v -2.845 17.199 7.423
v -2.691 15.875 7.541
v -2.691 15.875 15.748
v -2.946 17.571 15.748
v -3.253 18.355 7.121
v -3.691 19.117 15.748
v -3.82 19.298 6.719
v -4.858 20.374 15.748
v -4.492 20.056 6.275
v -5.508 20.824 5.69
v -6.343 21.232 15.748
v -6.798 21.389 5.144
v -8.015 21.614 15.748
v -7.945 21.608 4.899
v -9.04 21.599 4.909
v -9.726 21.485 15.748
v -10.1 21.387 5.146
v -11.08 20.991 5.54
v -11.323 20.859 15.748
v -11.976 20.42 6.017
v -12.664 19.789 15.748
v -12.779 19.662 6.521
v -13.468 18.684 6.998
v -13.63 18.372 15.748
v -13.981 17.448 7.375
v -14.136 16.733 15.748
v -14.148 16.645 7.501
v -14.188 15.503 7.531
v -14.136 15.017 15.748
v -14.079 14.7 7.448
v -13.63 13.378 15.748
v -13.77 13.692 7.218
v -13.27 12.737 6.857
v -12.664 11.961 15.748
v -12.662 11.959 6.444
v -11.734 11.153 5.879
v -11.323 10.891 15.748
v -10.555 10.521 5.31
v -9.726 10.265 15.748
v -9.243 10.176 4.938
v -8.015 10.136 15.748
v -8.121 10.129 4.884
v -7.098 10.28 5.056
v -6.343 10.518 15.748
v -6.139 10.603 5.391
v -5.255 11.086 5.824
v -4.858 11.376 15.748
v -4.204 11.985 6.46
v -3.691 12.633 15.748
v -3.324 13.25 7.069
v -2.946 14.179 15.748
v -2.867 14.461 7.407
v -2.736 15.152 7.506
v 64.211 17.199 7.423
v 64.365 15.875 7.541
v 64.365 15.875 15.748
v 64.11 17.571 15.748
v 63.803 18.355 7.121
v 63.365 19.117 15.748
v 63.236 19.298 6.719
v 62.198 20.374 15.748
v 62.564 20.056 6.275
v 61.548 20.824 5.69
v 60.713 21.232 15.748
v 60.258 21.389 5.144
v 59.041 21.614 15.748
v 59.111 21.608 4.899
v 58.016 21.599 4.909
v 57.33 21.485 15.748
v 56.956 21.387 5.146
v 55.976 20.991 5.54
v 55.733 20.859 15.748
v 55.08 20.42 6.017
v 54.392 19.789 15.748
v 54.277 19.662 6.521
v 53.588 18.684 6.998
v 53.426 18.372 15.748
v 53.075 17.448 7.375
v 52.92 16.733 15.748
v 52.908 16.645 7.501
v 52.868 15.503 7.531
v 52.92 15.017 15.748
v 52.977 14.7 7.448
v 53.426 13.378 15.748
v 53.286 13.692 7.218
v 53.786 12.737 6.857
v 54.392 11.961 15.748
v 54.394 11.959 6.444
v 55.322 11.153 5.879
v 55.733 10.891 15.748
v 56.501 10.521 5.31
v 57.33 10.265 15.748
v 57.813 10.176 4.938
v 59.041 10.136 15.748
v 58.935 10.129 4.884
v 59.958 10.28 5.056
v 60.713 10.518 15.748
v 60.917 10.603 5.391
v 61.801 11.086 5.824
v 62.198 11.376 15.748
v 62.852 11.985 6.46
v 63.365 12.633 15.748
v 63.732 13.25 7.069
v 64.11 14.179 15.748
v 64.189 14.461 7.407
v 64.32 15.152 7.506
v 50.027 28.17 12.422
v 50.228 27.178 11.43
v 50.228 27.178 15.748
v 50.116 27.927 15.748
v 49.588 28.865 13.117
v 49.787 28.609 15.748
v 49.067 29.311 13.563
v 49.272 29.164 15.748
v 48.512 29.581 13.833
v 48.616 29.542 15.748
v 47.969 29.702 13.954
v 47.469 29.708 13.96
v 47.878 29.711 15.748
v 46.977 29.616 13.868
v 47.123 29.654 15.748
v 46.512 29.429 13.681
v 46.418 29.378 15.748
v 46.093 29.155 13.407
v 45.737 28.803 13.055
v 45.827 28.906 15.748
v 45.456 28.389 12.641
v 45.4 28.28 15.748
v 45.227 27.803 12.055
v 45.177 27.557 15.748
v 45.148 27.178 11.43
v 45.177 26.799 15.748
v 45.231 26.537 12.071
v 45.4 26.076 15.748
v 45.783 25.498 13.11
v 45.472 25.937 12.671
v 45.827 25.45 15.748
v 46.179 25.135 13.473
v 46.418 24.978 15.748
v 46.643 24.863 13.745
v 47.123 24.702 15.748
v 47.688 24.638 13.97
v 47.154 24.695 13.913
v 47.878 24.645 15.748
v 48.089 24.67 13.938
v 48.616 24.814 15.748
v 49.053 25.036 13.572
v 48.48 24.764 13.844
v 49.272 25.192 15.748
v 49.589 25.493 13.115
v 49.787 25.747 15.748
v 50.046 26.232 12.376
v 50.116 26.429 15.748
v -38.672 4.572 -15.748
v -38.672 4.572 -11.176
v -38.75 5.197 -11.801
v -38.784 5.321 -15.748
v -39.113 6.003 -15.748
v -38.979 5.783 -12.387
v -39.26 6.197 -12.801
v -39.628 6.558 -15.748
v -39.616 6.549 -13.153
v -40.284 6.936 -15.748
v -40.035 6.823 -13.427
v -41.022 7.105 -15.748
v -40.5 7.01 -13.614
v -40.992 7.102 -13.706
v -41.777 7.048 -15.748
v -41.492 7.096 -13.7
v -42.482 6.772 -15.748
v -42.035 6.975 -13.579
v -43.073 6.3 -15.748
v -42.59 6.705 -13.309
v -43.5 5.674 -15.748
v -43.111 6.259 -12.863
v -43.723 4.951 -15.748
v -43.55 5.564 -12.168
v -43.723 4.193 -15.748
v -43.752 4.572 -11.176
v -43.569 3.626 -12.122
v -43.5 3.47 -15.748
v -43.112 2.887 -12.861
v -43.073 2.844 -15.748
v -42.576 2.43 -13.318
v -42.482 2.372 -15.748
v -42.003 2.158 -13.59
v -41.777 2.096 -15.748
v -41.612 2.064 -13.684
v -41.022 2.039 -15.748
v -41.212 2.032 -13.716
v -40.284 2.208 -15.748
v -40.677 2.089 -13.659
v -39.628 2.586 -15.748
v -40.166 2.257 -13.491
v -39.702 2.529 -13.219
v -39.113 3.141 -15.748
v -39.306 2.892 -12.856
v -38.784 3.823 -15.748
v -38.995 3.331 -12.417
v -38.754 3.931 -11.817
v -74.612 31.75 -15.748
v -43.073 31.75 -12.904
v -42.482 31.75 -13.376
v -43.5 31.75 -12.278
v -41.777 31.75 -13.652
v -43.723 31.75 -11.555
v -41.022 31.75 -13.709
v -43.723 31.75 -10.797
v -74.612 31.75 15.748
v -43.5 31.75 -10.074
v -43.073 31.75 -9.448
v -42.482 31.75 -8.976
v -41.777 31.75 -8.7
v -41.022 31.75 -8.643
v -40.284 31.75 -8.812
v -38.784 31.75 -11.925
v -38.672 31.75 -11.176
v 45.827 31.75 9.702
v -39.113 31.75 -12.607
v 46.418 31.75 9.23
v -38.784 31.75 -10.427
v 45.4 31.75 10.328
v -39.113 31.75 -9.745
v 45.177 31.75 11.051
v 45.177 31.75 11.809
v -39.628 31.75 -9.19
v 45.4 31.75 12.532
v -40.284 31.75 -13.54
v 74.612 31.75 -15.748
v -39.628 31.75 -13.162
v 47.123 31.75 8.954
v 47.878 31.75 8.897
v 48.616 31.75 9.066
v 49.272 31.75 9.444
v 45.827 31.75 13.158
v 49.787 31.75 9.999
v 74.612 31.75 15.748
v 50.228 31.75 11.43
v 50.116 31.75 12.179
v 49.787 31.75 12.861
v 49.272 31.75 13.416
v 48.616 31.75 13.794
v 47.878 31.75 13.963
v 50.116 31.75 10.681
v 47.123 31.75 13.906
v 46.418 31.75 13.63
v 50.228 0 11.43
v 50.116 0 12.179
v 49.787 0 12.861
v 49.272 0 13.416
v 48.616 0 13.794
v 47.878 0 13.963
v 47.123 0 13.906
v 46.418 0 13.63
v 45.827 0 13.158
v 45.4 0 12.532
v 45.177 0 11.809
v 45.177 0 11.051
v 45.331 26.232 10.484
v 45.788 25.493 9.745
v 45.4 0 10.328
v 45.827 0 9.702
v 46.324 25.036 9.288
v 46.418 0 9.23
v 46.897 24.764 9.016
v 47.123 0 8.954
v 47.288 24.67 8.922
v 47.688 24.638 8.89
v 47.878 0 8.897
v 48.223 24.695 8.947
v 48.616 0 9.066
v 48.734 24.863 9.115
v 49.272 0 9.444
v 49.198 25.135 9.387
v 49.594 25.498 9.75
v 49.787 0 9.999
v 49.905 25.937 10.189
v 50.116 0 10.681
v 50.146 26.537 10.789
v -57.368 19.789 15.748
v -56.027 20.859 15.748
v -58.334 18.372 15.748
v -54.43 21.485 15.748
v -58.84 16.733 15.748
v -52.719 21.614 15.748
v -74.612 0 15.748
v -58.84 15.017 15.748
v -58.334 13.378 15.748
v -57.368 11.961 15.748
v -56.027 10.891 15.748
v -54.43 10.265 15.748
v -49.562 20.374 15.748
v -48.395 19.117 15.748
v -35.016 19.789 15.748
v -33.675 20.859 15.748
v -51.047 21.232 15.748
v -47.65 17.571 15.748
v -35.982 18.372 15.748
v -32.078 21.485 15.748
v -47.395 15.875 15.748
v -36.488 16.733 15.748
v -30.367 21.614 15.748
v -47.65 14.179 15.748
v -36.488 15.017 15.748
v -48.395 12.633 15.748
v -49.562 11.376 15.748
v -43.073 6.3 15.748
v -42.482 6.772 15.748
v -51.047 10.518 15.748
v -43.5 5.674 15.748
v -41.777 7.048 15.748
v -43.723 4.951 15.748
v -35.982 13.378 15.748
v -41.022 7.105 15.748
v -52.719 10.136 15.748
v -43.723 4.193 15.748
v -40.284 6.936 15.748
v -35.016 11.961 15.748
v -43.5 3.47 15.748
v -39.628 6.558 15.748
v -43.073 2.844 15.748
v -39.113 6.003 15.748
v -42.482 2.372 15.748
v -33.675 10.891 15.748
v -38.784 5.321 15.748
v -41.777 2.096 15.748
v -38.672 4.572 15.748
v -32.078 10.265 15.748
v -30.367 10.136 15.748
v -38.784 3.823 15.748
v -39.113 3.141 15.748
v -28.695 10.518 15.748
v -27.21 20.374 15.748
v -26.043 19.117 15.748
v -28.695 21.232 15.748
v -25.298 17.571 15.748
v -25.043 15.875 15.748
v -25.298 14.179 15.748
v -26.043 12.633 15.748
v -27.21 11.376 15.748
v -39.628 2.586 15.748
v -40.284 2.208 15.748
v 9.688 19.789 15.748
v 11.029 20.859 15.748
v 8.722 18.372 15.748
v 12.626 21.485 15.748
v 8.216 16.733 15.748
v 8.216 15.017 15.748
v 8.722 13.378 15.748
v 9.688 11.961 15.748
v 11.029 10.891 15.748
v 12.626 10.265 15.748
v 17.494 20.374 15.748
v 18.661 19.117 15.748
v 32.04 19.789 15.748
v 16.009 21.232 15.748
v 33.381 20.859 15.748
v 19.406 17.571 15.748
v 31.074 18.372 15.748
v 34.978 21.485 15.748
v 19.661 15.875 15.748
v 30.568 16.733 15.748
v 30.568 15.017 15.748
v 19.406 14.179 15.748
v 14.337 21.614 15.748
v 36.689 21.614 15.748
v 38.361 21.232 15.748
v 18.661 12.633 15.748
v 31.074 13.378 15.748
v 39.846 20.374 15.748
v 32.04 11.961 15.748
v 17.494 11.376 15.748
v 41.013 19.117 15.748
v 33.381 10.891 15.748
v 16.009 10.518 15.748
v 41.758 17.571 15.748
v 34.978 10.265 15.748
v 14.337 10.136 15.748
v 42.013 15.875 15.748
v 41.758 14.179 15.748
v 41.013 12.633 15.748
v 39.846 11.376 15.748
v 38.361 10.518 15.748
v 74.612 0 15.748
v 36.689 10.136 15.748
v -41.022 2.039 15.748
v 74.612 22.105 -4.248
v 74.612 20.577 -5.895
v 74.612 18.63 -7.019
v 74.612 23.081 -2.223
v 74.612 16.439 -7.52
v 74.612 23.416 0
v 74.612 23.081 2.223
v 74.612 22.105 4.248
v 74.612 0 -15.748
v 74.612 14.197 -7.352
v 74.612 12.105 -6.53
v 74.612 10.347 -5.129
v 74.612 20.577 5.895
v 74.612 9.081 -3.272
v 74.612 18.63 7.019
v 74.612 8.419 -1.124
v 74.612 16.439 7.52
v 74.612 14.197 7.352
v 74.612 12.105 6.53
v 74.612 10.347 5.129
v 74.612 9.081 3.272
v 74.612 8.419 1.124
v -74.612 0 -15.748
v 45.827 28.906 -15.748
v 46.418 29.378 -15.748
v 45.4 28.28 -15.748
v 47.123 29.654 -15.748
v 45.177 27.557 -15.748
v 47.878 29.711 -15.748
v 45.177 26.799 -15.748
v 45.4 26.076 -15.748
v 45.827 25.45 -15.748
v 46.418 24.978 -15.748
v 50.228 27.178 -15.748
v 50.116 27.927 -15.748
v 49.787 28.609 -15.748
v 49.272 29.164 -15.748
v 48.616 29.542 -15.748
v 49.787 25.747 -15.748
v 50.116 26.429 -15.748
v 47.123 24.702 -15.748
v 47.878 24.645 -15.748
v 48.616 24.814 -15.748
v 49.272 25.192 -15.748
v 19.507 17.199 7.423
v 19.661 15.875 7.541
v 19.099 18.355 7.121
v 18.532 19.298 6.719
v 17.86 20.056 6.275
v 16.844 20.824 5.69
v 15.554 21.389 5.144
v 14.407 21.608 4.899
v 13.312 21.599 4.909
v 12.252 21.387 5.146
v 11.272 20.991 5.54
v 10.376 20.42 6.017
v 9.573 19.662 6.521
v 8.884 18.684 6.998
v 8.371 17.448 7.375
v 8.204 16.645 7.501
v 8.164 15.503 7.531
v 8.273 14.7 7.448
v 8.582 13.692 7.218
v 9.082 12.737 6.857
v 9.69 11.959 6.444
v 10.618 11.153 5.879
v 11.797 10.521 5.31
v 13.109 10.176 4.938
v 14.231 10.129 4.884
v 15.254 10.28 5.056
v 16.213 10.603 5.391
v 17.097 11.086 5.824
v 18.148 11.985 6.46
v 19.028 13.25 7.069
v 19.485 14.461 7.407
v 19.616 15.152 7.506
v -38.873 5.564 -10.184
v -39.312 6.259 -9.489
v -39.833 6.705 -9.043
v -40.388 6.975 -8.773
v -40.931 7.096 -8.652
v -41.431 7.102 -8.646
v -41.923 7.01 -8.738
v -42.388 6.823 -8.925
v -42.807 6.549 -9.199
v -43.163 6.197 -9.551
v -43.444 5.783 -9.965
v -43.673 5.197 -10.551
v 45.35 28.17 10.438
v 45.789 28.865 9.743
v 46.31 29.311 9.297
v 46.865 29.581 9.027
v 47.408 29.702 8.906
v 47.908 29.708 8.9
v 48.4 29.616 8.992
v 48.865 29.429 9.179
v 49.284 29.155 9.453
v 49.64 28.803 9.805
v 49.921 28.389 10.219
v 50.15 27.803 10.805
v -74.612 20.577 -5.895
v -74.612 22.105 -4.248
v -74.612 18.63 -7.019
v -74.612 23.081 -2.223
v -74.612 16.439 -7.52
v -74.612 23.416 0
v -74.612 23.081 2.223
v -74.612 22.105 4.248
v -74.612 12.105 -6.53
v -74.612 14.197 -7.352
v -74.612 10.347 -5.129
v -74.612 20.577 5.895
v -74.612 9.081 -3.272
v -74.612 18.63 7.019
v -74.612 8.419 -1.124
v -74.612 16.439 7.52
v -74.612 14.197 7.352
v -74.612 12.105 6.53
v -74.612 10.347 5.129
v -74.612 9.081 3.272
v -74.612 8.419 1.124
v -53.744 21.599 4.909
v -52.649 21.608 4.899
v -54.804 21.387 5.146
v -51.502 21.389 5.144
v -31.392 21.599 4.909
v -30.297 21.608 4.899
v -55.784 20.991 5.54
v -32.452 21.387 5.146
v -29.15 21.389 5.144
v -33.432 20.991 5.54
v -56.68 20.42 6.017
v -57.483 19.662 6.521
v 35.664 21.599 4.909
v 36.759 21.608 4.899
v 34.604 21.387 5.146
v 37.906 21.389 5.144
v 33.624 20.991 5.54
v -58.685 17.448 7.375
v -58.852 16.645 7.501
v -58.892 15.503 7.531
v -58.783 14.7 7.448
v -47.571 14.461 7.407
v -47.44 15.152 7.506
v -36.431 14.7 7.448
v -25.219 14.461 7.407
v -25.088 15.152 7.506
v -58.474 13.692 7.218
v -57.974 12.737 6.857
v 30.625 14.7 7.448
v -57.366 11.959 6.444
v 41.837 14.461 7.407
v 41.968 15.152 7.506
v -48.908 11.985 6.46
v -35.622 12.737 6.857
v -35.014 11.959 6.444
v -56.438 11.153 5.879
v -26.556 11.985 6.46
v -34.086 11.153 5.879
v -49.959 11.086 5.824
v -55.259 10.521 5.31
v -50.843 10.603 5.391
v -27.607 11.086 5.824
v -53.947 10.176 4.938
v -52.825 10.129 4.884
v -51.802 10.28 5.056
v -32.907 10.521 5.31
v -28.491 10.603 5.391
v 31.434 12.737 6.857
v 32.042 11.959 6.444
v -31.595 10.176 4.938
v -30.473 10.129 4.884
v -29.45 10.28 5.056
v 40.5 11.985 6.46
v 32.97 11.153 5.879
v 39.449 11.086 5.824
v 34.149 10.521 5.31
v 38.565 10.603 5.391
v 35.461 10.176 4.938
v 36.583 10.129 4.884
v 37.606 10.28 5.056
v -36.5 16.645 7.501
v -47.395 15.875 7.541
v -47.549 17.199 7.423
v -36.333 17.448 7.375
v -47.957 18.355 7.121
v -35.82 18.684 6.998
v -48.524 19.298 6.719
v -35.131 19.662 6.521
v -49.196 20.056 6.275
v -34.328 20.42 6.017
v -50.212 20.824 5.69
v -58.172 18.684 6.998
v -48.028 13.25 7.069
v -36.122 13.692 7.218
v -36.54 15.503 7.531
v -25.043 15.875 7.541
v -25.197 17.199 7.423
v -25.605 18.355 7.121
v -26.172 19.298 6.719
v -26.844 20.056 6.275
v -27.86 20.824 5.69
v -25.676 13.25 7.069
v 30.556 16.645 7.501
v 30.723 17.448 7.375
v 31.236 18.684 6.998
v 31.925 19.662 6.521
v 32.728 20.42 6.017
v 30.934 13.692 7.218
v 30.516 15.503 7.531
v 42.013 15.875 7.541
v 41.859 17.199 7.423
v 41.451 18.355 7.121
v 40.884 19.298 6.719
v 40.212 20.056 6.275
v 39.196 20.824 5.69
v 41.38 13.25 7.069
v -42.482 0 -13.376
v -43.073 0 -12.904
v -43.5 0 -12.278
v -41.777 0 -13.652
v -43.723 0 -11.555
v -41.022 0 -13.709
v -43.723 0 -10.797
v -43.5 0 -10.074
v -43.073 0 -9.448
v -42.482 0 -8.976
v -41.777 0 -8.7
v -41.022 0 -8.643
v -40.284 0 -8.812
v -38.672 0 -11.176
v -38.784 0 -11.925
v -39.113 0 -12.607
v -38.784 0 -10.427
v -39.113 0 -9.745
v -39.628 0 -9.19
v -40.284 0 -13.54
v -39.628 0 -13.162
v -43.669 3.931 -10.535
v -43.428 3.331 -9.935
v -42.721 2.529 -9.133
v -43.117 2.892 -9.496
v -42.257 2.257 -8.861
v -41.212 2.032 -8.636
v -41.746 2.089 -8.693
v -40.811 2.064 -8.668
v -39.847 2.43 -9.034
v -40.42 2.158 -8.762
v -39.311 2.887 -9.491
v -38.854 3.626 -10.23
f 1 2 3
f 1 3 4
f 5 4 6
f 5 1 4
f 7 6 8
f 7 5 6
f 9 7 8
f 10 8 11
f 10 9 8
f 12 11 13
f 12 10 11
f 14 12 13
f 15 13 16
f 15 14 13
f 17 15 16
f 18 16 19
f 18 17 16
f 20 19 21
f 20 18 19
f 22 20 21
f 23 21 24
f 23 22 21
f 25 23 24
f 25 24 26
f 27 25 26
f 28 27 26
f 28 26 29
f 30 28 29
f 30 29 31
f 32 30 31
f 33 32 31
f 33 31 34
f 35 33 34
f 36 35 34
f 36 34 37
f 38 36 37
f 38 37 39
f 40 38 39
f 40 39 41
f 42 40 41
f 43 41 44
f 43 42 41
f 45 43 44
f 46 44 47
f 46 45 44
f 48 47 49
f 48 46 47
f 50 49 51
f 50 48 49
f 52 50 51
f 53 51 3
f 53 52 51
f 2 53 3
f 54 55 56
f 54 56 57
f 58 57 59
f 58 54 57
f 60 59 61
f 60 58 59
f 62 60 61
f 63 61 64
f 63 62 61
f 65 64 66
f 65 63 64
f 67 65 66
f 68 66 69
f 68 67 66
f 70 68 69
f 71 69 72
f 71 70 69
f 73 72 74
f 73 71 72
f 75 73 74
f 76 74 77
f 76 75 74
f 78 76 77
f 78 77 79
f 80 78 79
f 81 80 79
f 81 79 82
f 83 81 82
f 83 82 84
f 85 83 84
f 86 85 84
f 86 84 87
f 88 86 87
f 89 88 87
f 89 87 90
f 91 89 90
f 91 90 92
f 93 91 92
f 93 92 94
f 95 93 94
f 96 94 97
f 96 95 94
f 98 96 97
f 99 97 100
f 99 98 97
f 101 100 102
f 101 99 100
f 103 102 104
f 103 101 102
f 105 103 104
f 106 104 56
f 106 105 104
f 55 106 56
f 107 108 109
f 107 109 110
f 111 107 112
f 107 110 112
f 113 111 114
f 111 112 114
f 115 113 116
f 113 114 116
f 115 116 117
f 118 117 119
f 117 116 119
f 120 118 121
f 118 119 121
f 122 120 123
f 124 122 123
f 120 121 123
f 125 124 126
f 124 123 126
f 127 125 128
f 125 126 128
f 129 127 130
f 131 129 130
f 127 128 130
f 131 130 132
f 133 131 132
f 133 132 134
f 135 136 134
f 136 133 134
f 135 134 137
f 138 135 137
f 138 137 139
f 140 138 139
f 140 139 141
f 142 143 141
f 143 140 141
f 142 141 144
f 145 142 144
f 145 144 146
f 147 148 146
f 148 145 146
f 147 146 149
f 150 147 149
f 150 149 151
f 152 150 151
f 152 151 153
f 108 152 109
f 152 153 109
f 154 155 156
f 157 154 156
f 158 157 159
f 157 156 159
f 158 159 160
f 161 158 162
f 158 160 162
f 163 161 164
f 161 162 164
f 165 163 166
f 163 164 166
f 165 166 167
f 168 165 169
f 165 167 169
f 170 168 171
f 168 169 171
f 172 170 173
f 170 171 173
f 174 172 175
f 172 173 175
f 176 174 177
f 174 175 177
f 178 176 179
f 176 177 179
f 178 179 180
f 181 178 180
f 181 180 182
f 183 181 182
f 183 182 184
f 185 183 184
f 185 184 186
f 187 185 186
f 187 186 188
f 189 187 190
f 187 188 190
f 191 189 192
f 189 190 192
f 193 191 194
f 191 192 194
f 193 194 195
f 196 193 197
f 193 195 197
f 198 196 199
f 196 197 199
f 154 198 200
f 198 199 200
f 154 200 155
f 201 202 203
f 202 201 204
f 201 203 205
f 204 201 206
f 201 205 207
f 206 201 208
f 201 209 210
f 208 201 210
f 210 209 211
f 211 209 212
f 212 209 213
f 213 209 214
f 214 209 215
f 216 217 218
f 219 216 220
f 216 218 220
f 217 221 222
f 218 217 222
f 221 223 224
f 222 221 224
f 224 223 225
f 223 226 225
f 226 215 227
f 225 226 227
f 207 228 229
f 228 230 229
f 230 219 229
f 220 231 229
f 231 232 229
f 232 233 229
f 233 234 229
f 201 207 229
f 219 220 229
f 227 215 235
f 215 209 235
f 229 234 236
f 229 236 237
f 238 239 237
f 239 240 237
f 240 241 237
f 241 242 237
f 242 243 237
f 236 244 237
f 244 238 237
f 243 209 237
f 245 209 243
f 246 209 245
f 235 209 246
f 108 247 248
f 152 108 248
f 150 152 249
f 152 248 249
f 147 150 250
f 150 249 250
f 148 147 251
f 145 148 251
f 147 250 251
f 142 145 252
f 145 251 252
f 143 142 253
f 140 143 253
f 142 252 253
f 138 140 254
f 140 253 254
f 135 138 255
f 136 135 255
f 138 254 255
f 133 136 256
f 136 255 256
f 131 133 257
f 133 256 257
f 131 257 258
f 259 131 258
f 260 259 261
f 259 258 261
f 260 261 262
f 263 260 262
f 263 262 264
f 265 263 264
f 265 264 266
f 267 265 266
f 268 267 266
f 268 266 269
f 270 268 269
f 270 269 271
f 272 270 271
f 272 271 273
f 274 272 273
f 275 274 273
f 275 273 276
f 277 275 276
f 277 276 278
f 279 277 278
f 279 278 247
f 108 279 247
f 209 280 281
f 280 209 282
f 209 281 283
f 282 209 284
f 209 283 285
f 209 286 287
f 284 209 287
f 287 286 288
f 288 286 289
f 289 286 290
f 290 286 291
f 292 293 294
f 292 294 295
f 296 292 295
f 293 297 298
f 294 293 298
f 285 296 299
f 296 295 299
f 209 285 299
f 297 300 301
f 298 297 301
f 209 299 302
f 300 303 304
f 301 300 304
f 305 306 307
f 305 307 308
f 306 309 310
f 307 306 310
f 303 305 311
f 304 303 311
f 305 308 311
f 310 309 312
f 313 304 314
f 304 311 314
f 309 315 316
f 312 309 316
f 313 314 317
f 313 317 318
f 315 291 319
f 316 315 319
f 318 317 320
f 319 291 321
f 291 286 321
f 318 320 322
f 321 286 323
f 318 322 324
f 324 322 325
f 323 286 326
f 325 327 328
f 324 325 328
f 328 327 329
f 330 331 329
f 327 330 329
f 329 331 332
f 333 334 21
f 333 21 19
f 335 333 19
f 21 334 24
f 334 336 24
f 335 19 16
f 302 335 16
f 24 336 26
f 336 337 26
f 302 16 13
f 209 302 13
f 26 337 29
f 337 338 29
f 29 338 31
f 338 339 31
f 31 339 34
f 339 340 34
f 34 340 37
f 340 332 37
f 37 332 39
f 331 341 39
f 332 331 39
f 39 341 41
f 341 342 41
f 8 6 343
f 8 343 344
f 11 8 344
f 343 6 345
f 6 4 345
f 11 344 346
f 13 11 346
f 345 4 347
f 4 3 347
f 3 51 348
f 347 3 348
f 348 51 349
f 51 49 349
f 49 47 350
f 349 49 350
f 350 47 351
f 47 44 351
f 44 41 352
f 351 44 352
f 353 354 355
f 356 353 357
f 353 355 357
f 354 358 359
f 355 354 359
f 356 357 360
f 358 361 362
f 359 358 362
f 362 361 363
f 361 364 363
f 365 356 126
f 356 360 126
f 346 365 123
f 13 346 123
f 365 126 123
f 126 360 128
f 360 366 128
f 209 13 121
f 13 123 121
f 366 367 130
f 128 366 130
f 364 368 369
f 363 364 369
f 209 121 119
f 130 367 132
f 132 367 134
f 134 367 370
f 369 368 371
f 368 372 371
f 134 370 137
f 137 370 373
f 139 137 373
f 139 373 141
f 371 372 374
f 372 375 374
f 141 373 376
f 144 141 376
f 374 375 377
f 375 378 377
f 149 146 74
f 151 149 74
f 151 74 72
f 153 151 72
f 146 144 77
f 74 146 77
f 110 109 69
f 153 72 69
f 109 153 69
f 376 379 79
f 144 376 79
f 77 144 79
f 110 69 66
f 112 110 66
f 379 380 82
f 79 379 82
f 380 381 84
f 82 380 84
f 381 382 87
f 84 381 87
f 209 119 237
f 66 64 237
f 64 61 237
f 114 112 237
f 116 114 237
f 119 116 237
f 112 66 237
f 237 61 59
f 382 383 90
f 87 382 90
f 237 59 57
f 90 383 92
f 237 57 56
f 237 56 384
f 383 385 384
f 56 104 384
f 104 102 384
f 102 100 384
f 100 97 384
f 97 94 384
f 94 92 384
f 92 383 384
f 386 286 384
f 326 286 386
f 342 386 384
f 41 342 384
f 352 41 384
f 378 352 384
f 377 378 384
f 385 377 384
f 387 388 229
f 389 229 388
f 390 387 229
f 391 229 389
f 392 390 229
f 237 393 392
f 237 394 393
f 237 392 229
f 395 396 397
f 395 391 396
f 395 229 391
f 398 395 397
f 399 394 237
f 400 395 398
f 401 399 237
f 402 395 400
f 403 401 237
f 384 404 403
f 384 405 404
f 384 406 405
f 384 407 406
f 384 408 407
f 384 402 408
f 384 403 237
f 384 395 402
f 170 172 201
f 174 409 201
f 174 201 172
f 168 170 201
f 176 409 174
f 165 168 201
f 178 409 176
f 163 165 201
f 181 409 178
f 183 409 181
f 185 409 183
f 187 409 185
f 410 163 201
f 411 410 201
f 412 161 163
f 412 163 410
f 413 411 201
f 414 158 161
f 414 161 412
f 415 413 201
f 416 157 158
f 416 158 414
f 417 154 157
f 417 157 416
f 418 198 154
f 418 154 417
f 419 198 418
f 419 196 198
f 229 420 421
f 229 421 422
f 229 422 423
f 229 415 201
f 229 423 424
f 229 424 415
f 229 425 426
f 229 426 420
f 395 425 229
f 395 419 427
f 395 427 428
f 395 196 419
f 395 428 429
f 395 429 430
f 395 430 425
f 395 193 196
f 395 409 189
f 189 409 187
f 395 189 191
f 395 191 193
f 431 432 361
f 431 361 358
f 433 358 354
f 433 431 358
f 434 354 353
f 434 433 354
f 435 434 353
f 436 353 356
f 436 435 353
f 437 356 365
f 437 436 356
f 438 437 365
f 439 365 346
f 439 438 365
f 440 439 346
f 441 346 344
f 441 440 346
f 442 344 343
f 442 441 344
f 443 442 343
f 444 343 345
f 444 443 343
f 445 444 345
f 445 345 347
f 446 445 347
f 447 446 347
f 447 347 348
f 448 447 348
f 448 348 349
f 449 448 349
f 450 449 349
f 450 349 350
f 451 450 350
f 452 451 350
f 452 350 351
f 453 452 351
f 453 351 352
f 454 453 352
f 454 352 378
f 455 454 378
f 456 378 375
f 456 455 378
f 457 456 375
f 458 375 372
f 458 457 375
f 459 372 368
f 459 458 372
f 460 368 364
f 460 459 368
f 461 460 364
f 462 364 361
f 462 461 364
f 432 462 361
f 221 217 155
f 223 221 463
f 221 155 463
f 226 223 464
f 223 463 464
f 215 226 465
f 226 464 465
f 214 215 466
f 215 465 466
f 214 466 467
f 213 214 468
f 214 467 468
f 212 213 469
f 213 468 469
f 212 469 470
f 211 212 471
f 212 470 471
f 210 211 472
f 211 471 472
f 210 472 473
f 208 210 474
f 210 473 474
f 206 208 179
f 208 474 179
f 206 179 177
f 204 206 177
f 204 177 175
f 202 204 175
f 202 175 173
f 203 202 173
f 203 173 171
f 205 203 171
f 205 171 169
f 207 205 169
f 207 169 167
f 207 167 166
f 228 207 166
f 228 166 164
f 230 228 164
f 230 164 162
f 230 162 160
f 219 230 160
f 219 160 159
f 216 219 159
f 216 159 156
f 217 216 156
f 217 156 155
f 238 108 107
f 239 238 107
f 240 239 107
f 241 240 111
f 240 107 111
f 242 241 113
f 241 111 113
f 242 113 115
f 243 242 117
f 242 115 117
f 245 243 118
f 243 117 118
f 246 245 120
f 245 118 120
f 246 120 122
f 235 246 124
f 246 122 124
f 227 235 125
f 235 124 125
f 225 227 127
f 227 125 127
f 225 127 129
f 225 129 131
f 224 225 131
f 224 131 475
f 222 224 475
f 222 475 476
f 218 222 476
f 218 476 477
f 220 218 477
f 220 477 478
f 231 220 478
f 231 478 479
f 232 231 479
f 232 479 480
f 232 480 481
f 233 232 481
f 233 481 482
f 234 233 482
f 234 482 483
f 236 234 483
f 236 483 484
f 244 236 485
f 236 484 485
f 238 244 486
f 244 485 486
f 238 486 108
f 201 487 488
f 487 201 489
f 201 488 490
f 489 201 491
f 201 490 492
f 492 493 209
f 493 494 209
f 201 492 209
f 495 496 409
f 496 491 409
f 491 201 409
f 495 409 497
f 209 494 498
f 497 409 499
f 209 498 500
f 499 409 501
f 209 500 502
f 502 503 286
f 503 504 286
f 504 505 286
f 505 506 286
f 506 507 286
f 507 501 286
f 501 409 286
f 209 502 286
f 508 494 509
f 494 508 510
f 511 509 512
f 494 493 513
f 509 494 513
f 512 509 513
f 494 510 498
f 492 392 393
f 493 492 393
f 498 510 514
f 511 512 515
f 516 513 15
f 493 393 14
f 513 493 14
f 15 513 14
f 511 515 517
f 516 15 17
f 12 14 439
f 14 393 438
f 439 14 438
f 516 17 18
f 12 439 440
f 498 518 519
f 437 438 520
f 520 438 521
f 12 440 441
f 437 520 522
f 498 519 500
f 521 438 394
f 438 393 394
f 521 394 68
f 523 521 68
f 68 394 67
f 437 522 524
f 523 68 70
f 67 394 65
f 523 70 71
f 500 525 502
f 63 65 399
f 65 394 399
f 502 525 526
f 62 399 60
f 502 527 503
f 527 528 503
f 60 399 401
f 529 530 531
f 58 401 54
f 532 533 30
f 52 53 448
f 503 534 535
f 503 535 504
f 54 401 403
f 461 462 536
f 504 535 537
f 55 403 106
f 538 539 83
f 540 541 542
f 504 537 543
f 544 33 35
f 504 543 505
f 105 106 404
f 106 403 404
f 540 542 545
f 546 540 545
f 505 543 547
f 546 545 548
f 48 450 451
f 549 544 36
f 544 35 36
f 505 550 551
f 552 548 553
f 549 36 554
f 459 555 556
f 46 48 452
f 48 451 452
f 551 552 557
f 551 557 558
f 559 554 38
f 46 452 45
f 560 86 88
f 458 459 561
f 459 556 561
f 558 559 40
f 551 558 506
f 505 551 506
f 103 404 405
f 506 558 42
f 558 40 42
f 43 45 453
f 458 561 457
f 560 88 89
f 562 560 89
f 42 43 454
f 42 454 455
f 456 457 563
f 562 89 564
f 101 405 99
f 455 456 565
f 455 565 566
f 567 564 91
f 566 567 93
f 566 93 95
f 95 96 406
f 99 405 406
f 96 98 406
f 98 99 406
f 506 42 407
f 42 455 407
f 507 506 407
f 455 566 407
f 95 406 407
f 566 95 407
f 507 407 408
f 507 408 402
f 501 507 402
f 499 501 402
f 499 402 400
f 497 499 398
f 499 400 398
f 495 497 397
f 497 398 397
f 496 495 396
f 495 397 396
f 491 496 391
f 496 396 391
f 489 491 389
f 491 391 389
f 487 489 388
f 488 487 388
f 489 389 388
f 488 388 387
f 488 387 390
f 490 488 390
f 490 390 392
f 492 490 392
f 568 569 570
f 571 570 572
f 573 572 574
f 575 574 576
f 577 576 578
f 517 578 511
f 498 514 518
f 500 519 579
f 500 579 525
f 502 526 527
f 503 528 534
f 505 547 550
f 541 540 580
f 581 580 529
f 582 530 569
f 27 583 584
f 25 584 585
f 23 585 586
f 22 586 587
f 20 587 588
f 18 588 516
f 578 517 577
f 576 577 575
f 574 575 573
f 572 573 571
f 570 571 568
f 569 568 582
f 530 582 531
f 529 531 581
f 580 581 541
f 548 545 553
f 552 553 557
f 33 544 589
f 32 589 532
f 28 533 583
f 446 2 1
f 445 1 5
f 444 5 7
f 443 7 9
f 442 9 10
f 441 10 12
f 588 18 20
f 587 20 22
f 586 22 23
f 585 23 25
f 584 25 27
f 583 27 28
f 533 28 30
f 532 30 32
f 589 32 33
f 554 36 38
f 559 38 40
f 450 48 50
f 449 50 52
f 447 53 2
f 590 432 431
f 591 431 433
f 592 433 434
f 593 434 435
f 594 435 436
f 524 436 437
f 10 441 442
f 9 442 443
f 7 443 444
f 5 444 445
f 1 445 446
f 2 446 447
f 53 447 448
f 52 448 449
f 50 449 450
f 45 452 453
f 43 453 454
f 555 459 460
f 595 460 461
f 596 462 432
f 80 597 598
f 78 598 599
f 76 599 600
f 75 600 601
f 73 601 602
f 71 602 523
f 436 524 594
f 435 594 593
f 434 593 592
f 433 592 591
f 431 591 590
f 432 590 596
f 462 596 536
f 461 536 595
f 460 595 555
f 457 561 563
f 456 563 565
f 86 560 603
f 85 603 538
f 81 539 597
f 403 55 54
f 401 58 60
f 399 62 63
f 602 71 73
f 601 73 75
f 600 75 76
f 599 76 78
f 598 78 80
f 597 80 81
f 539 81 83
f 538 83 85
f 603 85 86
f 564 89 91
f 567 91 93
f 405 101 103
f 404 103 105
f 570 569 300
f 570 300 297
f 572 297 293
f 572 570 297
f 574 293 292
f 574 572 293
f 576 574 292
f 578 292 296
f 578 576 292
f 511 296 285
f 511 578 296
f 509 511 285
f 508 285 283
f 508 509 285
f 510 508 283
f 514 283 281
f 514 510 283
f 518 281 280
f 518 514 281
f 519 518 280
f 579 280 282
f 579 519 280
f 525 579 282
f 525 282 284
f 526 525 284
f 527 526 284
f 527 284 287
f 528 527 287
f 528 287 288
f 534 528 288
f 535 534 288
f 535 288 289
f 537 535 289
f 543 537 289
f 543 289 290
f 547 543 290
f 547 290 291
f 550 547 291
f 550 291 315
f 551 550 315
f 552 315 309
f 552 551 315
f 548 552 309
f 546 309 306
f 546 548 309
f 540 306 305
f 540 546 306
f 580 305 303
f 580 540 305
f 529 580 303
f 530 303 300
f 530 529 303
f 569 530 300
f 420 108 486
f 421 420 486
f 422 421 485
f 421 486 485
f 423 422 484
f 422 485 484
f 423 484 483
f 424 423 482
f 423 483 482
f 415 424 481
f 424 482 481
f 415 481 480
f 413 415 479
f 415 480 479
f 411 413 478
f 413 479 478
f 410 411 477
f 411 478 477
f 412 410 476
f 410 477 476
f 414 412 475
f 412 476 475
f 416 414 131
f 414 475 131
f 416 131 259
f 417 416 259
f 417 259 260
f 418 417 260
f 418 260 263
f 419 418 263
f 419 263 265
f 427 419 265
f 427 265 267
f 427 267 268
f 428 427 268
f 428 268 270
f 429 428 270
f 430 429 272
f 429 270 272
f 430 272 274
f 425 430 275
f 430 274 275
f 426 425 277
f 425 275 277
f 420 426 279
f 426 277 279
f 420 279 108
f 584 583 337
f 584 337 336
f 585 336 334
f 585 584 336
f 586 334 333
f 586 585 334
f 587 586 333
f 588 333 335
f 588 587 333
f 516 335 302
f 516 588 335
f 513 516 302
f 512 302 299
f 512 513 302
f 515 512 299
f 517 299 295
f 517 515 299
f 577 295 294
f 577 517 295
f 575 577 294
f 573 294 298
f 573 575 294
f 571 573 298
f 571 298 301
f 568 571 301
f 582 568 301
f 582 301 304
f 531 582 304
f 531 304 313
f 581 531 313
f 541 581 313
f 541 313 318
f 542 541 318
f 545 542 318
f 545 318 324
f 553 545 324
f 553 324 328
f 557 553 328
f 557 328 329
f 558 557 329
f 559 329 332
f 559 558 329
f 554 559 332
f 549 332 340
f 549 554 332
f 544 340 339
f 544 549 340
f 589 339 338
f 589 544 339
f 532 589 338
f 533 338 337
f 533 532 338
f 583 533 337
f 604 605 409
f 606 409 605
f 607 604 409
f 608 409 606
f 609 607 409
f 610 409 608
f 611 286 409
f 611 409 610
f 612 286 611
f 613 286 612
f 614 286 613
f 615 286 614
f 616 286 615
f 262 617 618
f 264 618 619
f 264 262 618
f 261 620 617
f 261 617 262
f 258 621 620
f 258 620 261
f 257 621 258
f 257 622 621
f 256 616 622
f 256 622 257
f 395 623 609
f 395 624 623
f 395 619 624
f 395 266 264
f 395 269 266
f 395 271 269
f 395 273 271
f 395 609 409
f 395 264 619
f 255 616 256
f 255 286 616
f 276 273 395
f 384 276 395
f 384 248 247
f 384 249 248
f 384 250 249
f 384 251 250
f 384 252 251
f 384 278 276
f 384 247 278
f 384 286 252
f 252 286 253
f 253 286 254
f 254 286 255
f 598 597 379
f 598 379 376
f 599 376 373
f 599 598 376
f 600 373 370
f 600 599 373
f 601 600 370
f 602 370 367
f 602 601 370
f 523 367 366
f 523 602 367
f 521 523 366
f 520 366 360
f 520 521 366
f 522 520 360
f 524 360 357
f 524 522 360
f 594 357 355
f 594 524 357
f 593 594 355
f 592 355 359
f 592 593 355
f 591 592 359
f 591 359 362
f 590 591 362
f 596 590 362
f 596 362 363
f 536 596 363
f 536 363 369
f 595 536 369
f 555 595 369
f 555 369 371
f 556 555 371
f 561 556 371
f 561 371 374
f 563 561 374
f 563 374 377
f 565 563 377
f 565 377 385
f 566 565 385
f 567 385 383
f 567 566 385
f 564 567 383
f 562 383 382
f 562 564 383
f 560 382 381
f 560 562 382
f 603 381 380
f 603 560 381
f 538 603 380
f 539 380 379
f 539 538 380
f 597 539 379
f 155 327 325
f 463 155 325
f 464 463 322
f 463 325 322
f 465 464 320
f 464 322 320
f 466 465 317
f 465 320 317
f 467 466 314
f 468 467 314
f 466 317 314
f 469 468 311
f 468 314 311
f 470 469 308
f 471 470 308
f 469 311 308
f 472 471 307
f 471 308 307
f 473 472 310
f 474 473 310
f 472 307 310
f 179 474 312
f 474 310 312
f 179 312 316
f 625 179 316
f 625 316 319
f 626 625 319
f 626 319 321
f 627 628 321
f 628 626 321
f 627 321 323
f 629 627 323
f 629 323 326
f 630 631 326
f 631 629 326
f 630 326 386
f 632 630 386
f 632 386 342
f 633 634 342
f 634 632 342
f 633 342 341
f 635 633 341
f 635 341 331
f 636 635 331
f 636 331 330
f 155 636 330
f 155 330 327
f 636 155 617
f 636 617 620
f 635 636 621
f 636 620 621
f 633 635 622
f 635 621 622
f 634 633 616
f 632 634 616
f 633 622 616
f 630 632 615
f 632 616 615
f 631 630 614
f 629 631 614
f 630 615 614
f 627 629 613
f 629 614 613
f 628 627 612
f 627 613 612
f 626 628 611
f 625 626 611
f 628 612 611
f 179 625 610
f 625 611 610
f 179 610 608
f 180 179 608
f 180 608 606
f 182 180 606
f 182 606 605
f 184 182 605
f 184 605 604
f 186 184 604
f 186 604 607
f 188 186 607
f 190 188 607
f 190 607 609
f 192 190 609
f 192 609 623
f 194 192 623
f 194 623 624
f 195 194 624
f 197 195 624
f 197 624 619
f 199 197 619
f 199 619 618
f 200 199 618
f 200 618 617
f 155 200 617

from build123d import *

# Parameters (mm, degrees)
F0_W     = 149.225
F0_H     = 31.496
F1_DEPTH = 31.75
F2_R     = 5.754688
F3_DEPTH = 15.875
F4_R     = 7.540625
F5_DEPTH = 149.226
F6_R     = 2.54
F7_DEPTH = 31.751
F8_R     = 2.54
F9_DEPTH = 31.497


with BuildPart() as f1:
    # F0 (on Front) → F1 (new body)
    with BuildSketch(Plane.XZ):
        Rectangle(F0_W, F0_H)
    extrude(amount=-F1_DEPTH)

    # F2 (on Top) → F3 (cut)
    with BuildSketch(Plane.XY):
        with Locations((-53.1495, 15.875)):
            Circle(F2_R)
        with Locations((-30.7975, 15.875)):
            Circle(F2_R)
        with Locations((-8.4455, 15.875)):
            Circle(F2_R)
        with Locations((13.9065, 15.875)):
            Circle(F2_R)
        with Locations((36.2585, 15.875)):
            Circle(F2_R)
        with Locations((58.6105, 15.875)):
            Circle(F2_R)
    extrude(amount=F3_DEPTH, mode=Mode.SUBTRACT)

    # F4 (on face) → F5 (cut, through all)
    with BuildSketch(Plane.YZ.offset(74.6125)):
        with Locations((15.875, 0)):
            Circle(F4_R)
    extrude(amount=-F5_DEPTH, mode=Mode.SUBTRACT)

    # F6 (on face) → F7 (cut, through all)
    with BuildSketch(Plane.XZ):
        with Locations((-41.2115, -11.176)):
            Circle(F6_R)
        with Locations((47.6885, 11.43)):
            Circle(F6_R)
    extrude(amount=-F7_DEPTH, mode=Mode.SUBTRACT)

    # F8 (on face) → F9 (cut, through all)
    with BuildSketch(Plane.XY.offset(15.748)):
        with Locations((47.6885, 27.178)):
            Circle(F8_R)
        with Locations((-41.2115, 4.572)):
            Circle(F8_R)
    extrude(amount=-F9_DEPTH, mode=Mode.SUBTRACT)


solid = f1.part
